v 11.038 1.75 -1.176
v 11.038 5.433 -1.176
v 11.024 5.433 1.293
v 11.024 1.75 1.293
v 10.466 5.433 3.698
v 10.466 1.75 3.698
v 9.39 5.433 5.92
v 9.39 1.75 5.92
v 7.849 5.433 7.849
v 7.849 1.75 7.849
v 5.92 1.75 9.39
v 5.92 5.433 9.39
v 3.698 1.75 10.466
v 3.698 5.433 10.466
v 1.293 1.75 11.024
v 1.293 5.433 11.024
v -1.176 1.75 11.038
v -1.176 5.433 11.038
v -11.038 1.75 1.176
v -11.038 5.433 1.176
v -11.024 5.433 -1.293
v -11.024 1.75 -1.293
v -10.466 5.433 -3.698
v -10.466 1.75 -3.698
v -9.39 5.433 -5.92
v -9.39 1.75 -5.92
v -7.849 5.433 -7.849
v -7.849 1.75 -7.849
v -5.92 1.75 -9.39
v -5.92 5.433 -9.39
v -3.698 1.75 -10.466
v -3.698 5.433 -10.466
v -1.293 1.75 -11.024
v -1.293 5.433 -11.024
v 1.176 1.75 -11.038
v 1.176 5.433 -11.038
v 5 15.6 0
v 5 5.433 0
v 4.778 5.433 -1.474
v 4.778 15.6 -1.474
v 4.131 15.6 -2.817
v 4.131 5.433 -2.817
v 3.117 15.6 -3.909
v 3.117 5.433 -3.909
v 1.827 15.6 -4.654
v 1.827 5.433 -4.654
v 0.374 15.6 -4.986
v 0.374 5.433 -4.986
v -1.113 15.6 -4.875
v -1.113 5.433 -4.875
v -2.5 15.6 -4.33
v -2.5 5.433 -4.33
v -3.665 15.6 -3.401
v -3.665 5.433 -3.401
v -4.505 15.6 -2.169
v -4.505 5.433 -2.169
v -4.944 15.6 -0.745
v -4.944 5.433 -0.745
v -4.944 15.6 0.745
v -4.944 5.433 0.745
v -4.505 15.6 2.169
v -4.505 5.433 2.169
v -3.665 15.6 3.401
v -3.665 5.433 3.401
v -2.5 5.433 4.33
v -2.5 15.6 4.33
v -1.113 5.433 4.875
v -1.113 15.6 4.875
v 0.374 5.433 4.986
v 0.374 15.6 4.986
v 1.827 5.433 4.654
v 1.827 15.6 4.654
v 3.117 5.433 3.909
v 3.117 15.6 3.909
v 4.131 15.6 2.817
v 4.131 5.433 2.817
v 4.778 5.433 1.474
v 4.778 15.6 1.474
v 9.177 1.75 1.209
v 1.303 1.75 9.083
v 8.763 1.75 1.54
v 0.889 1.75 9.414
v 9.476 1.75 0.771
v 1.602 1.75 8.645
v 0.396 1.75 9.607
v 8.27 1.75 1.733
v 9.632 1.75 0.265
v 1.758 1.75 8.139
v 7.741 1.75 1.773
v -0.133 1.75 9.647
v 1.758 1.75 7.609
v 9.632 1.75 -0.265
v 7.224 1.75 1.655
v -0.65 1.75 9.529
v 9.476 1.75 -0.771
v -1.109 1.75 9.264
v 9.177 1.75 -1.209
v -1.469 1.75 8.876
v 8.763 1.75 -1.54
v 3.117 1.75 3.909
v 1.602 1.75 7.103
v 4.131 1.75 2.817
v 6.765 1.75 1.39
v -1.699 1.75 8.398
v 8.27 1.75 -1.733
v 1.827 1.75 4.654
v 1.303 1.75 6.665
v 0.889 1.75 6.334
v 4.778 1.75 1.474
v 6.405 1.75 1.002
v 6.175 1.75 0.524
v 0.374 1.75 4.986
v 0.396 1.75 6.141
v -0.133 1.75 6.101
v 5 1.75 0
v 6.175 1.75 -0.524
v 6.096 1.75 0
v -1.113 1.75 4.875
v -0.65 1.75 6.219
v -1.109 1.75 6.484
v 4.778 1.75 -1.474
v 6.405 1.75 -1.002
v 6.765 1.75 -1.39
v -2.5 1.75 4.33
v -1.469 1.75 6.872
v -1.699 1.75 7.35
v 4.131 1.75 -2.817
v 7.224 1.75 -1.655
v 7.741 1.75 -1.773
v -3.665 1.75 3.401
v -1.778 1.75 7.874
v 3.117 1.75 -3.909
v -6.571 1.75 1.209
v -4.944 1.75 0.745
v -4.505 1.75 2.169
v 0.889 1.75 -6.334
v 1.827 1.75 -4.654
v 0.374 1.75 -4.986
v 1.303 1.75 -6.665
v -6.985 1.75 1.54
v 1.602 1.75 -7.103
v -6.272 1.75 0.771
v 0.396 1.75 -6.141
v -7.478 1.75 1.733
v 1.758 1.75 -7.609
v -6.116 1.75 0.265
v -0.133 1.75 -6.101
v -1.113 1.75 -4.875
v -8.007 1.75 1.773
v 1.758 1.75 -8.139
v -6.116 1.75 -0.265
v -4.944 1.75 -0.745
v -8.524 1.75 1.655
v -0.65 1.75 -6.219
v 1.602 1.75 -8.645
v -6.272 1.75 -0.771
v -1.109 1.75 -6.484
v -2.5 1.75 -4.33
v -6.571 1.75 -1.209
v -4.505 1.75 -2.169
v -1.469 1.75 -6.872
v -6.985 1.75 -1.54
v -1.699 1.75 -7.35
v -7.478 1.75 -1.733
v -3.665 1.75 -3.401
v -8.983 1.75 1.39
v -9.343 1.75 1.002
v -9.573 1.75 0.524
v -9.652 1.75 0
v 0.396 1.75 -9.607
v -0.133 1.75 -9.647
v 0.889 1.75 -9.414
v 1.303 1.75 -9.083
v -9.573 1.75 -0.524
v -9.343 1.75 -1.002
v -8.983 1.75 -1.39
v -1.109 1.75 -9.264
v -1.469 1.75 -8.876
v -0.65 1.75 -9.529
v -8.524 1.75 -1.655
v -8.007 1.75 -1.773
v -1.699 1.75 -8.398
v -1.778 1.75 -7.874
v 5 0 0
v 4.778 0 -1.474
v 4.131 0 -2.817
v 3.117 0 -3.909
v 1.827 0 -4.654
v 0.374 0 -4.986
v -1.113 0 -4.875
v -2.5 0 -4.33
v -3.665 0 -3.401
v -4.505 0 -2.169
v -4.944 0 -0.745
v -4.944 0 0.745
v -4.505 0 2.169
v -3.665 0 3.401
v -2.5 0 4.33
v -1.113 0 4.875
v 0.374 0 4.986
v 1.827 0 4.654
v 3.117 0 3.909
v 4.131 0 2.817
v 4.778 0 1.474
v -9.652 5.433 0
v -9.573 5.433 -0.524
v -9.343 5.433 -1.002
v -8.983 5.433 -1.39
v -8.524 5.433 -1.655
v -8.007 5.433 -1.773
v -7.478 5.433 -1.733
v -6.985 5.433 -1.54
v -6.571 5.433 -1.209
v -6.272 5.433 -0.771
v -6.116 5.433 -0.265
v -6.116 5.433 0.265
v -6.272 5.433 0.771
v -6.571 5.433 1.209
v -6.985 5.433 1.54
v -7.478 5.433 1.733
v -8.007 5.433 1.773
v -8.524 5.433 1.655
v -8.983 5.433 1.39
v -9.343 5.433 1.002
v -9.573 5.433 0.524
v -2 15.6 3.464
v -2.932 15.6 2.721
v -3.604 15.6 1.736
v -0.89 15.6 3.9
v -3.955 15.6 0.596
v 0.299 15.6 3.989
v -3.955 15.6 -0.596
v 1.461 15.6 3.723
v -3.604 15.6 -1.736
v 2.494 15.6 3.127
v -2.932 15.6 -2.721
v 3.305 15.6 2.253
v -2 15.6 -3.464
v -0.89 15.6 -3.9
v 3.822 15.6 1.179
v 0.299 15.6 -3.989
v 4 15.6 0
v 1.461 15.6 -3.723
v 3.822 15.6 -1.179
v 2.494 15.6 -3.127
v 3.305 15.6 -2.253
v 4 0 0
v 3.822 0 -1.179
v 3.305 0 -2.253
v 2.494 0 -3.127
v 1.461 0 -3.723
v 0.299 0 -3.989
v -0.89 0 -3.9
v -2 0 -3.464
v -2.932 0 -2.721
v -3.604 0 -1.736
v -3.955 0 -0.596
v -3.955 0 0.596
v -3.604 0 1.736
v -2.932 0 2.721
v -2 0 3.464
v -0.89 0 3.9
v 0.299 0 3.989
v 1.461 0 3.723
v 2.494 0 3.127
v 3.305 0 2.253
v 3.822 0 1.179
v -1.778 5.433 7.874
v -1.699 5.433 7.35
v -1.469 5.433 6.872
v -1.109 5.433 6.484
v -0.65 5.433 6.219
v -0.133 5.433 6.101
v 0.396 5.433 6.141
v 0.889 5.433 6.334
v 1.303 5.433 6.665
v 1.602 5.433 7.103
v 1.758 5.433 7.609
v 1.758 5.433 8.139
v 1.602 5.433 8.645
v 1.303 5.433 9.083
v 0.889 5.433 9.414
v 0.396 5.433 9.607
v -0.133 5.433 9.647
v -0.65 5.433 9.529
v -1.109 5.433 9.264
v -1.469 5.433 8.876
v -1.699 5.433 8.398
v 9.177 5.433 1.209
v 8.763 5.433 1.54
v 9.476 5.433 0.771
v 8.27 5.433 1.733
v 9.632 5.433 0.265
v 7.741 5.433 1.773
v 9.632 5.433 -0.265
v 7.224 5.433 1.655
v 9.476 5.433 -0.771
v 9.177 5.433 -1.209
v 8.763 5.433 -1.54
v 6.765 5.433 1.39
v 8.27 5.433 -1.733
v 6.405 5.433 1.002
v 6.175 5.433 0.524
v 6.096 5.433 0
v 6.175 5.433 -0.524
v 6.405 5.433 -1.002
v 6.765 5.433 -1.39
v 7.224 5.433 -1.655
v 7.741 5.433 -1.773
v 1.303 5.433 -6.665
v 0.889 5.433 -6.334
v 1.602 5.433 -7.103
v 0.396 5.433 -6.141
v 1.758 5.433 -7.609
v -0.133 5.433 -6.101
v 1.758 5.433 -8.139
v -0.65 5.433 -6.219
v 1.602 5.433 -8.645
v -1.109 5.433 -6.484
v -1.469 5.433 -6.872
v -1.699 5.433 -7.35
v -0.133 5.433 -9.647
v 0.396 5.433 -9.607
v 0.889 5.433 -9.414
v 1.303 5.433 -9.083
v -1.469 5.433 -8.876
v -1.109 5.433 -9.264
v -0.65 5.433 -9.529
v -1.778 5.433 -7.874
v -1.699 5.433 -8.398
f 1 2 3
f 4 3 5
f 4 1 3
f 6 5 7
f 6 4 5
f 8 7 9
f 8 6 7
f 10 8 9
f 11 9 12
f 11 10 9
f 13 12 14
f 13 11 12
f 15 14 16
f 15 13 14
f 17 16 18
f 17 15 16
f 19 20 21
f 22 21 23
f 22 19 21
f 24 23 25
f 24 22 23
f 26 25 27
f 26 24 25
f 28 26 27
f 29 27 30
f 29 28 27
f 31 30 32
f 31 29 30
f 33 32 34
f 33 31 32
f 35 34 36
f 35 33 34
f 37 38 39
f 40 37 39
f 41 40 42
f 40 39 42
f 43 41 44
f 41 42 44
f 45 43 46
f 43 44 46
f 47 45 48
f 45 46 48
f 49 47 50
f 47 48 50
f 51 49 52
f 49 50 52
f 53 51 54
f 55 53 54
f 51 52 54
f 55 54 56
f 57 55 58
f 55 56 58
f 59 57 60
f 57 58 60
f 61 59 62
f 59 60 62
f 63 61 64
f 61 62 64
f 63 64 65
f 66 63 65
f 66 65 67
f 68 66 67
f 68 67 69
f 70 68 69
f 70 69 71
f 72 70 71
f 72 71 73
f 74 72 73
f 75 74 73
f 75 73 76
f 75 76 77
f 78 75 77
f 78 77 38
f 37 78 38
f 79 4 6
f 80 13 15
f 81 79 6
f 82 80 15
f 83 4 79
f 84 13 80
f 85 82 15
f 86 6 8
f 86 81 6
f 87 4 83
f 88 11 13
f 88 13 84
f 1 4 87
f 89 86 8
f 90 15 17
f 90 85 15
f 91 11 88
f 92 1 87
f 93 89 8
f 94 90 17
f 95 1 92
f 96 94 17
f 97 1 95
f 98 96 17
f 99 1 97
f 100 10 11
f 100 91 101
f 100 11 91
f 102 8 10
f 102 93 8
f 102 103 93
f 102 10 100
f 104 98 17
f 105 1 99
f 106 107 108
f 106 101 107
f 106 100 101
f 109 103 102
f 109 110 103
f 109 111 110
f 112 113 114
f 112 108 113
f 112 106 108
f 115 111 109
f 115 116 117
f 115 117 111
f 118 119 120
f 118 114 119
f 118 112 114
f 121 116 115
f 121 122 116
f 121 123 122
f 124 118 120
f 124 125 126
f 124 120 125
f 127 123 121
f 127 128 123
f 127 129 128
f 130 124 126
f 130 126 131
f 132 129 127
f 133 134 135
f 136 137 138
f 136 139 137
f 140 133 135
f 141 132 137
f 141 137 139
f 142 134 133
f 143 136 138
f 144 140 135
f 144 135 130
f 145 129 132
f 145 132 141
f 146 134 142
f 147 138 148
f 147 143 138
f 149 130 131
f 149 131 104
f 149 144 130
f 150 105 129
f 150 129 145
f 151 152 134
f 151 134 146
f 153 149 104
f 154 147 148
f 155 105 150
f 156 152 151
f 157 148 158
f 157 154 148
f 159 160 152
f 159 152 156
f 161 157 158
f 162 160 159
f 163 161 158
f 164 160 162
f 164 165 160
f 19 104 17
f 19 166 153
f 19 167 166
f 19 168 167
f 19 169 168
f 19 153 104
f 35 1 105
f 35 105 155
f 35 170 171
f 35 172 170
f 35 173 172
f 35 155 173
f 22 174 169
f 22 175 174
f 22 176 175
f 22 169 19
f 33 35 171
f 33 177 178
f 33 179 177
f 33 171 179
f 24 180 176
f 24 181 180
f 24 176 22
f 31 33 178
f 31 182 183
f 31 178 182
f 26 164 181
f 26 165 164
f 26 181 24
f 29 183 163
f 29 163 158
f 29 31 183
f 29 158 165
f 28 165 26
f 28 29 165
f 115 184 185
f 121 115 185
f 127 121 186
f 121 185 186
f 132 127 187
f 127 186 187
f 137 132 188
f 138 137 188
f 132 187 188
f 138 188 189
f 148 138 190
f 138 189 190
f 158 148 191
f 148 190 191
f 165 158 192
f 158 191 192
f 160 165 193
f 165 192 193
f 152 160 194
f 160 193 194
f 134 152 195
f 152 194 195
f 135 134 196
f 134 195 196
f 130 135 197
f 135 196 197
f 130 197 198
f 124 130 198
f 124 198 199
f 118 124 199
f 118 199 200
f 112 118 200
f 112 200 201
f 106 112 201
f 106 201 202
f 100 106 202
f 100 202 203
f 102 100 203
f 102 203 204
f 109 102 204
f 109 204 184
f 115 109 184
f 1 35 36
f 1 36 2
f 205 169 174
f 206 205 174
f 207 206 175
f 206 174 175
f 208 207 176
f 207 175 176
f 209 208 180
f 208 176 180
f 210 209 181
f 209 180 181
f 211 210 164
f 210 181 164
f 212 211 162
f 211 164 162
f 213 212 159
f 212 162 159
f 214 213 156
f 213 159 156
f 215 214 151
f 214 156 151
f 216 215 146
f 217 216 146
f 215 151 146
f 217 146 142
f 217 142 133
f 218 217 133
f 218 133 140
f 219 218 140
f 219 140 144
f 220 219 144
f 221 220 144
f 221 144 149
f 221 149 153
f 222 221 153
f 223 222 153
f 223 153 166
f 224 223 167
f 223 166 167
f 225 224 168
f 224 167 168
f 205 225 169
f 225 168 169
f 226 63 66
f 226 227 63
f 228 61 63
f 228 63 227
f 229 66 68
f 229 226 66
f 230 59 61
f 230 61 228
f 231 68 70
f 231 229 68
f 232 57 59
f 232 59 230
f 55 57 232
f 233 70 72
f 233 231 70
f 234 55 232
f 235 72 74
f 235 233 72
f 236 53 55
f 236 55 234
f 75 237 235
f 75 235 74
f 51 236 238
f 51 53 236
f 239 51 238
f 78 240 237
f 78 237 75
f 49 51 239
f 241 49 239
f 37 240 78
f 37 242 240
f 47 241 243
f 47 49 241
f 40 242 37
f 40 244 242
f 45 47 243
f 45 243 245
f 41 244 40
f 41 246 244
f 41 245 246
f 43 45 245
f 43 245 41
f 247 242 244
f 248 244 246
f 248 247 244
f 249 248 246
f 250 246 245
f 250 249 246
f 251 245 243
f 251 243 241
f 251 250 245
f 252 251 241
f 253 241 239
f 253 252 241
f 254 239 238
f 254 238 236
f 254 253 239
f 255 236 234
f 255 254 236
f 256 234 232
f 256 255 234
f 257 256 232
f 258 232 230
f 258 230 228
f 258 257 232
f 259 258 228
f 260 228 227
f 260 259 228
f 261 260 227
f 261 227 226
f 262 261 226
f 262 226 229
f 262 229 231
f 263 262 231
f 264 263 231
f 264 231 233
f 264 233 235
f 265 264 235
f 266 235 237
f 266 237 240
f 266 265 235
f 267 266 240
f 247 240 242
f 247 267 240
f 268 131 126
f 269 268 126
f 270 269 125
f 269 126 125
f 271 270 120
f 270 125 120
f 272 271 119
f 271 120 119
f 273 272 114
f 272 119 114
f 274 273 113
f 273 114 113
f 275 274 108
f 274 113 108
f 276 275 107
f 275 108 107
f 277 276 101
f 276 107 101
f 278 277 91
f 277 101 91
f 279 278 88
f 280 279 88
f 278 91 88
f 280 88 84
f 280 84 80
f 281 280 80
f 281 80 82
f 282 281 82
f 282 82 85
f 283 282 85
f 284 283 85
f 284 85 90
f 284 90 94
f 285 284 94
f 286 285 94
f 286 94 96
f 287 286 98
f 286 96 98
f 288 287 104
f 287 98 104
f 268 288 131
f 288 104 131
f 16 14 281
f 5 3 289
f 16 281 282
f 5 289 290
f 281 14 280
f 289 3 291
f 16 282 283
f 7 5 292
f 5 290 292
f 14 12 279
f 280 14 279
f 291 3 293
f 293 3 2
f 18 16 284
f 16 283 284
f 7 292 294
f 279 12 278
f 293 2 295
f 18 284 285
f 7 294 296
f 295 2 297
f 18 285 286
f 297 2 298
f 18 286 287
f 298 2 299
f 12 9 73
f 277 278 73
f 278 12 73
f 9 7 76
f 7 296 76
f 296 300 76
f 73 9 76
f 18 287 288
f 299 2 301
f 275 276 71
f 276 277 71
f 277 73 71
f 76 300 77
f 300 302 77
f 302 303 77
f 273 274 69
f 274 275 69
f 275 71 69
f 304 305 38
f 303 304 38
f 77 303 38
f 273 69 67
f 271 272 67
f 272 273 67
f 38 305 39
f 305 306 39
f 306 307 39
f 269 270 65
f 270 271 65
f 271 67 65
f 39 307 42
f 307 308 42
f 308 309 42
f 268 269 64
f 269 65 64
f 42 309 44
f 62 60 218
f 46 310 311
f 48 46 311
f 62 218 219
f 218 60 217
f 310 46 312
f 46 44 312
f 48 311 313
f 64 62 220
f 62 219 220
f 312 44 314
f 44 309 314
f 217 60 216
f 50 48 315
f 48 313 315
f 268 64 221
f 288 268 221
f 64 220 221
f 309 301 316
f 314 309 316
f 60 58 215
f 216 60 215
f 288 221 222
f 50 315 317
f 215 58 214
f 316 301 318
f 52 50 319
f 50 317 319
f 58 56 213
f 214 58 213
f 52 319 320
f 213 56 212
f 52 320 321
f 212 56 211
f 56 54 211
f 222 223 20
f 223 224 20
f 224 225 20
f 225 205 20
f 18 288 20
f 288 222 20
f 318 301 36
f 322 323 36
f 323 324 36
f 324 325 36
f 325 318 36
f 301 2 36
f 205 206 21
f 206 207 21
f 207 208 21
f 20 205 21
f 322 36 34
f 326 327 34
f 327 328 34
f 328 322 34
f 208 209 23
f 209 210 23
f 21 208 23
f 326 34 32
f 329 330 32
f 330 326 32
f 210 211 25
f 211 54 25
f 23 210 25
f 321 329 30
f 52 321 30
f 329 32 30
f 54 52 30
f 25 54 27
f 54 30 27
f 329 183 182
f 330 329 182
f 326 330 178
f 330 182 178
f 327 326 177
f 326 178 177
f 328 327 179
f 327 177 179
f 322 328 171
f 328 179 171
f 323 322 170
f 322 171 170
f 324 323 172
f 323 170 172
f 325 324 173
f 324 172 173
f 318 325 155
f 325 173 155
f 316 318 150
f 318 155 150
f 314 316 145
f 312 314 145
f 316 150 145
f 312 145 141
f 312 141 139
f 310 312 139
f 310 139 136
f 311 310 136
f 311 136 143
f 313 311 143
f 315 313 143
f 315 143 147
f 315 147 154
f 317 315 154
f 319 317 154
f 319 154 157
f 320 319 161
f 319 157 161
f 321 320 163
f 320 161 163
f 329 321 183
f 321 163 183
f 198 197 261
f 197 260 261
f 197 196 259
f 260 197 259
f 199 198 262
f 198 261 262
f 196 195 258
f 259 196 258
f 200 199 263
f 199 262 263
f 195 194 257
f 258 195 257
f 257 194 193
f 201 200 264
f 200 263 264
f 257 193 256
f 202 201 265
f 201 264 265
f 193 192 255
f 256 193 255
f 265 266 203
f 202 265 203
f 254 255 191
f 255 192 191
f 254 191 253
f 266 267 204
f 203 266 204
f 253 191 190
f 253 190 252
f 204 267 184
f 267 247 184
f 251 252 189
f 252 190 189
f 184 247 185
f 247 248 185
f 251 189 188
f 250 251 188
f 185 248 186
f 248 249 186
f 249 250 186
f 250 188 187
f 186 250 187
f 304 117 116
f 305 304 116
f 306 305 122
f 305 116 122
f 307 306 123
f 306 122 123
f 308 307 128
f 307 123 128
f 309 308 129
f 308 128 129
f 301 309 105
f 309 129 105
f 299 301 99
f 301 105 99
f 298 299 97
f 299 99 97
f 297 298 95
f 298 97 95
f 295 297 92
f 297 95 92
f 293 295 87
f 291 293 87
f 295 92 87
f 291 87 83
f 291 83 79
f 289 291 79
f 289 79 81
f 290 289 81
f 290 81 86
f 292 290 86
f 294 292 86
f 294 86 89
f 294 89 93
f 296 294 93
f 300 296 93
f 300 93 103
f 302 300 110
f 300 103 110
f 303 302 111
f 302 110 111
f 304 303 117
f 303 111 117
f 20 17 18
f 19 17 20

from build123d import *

# Parameters (mm, degrees)
SKETCH1_R           = 5
SKETCH1_R_2         = 4
BOSS_EXTRUDE1_DEPTH = 15.6
SKETCH2_R           = 11.1
SKETCH2_R_2         = 5
SKETCH2_R_3         = 1.778
BOSS_EXTRUDE2_DEPTH = 3.683
SKETCH3_OUTSIDE_W   = 31.212
SKETCH3_OUTSIDE_H   = 31.212
CUT_EXTRUDE1_DEPTH  = 14.849999944


with BuildPart() as part:
    # Sketch1 → Boss-Extrude1 (new body)
    with BuildSketch(Plane(origin=(0, 0, 0), x_dir=(1, 0, 0), z_dir=(0, 1, 0))):
        Circle(SKETCH1_R)
        Circle(SKETCH1_R_2, mode=Mode.SUBTRACT)
    extrude(amount=BOSS_EXTRUDE1_DEPTH)

    # Sketch2 → Boss-Extrude2 (add)
    with BuildSketch(Plane(origin=(0, 1.750000056, 0), x_dir=(-1, 0, 0), z_dir=(0, -1, 0))):
        Circle(SKETCH2_R)
        Circle(SKETCH2_R_2, mode=Mode.SUBTRACT)
        with Locations((0, 7.874)):
            Circle(SKETCH2_R_3, mode=Mode.SUBTRACT)
        with Locations((7.874, 0)):
            Circle(SKETCH2_R_3, mode=Mode.SUBTRACT)
        with Locations((0, -7.874)):
            Circle(SKETCH2_R_3, mode=Mode.SUBTRACT)
        with Locations((-7.874, 0)):
            Circle(SKETCH2_R_3, mode=Mode.SUBTRACT)
    extrude(amount=-BOSS_EXTRUDE2_DEPTH)

    # Sketch3 outside → Cut-Extrude1 (cut, through all)
    with BuildSketch(Plane.XZ.offset(-1.750000056)):
        Rectangle(SKETCH3_OUTSIDE_W, SKETCH3_OUTSIDE_H)
        Polygon((0.010892417, -12.202255907), (16.316615828, 4.103467504), (4.103467504, 16.316615828), (-15.606056949, -3.392908624), (-3.392908624, -15.606056949), align=None, mode=Mode.SUBTRACT)
    extrude(amount=-CUT_EXTRUDE1_DEPTH, mode=Mode.SUBTRACT)


solid = part.part
